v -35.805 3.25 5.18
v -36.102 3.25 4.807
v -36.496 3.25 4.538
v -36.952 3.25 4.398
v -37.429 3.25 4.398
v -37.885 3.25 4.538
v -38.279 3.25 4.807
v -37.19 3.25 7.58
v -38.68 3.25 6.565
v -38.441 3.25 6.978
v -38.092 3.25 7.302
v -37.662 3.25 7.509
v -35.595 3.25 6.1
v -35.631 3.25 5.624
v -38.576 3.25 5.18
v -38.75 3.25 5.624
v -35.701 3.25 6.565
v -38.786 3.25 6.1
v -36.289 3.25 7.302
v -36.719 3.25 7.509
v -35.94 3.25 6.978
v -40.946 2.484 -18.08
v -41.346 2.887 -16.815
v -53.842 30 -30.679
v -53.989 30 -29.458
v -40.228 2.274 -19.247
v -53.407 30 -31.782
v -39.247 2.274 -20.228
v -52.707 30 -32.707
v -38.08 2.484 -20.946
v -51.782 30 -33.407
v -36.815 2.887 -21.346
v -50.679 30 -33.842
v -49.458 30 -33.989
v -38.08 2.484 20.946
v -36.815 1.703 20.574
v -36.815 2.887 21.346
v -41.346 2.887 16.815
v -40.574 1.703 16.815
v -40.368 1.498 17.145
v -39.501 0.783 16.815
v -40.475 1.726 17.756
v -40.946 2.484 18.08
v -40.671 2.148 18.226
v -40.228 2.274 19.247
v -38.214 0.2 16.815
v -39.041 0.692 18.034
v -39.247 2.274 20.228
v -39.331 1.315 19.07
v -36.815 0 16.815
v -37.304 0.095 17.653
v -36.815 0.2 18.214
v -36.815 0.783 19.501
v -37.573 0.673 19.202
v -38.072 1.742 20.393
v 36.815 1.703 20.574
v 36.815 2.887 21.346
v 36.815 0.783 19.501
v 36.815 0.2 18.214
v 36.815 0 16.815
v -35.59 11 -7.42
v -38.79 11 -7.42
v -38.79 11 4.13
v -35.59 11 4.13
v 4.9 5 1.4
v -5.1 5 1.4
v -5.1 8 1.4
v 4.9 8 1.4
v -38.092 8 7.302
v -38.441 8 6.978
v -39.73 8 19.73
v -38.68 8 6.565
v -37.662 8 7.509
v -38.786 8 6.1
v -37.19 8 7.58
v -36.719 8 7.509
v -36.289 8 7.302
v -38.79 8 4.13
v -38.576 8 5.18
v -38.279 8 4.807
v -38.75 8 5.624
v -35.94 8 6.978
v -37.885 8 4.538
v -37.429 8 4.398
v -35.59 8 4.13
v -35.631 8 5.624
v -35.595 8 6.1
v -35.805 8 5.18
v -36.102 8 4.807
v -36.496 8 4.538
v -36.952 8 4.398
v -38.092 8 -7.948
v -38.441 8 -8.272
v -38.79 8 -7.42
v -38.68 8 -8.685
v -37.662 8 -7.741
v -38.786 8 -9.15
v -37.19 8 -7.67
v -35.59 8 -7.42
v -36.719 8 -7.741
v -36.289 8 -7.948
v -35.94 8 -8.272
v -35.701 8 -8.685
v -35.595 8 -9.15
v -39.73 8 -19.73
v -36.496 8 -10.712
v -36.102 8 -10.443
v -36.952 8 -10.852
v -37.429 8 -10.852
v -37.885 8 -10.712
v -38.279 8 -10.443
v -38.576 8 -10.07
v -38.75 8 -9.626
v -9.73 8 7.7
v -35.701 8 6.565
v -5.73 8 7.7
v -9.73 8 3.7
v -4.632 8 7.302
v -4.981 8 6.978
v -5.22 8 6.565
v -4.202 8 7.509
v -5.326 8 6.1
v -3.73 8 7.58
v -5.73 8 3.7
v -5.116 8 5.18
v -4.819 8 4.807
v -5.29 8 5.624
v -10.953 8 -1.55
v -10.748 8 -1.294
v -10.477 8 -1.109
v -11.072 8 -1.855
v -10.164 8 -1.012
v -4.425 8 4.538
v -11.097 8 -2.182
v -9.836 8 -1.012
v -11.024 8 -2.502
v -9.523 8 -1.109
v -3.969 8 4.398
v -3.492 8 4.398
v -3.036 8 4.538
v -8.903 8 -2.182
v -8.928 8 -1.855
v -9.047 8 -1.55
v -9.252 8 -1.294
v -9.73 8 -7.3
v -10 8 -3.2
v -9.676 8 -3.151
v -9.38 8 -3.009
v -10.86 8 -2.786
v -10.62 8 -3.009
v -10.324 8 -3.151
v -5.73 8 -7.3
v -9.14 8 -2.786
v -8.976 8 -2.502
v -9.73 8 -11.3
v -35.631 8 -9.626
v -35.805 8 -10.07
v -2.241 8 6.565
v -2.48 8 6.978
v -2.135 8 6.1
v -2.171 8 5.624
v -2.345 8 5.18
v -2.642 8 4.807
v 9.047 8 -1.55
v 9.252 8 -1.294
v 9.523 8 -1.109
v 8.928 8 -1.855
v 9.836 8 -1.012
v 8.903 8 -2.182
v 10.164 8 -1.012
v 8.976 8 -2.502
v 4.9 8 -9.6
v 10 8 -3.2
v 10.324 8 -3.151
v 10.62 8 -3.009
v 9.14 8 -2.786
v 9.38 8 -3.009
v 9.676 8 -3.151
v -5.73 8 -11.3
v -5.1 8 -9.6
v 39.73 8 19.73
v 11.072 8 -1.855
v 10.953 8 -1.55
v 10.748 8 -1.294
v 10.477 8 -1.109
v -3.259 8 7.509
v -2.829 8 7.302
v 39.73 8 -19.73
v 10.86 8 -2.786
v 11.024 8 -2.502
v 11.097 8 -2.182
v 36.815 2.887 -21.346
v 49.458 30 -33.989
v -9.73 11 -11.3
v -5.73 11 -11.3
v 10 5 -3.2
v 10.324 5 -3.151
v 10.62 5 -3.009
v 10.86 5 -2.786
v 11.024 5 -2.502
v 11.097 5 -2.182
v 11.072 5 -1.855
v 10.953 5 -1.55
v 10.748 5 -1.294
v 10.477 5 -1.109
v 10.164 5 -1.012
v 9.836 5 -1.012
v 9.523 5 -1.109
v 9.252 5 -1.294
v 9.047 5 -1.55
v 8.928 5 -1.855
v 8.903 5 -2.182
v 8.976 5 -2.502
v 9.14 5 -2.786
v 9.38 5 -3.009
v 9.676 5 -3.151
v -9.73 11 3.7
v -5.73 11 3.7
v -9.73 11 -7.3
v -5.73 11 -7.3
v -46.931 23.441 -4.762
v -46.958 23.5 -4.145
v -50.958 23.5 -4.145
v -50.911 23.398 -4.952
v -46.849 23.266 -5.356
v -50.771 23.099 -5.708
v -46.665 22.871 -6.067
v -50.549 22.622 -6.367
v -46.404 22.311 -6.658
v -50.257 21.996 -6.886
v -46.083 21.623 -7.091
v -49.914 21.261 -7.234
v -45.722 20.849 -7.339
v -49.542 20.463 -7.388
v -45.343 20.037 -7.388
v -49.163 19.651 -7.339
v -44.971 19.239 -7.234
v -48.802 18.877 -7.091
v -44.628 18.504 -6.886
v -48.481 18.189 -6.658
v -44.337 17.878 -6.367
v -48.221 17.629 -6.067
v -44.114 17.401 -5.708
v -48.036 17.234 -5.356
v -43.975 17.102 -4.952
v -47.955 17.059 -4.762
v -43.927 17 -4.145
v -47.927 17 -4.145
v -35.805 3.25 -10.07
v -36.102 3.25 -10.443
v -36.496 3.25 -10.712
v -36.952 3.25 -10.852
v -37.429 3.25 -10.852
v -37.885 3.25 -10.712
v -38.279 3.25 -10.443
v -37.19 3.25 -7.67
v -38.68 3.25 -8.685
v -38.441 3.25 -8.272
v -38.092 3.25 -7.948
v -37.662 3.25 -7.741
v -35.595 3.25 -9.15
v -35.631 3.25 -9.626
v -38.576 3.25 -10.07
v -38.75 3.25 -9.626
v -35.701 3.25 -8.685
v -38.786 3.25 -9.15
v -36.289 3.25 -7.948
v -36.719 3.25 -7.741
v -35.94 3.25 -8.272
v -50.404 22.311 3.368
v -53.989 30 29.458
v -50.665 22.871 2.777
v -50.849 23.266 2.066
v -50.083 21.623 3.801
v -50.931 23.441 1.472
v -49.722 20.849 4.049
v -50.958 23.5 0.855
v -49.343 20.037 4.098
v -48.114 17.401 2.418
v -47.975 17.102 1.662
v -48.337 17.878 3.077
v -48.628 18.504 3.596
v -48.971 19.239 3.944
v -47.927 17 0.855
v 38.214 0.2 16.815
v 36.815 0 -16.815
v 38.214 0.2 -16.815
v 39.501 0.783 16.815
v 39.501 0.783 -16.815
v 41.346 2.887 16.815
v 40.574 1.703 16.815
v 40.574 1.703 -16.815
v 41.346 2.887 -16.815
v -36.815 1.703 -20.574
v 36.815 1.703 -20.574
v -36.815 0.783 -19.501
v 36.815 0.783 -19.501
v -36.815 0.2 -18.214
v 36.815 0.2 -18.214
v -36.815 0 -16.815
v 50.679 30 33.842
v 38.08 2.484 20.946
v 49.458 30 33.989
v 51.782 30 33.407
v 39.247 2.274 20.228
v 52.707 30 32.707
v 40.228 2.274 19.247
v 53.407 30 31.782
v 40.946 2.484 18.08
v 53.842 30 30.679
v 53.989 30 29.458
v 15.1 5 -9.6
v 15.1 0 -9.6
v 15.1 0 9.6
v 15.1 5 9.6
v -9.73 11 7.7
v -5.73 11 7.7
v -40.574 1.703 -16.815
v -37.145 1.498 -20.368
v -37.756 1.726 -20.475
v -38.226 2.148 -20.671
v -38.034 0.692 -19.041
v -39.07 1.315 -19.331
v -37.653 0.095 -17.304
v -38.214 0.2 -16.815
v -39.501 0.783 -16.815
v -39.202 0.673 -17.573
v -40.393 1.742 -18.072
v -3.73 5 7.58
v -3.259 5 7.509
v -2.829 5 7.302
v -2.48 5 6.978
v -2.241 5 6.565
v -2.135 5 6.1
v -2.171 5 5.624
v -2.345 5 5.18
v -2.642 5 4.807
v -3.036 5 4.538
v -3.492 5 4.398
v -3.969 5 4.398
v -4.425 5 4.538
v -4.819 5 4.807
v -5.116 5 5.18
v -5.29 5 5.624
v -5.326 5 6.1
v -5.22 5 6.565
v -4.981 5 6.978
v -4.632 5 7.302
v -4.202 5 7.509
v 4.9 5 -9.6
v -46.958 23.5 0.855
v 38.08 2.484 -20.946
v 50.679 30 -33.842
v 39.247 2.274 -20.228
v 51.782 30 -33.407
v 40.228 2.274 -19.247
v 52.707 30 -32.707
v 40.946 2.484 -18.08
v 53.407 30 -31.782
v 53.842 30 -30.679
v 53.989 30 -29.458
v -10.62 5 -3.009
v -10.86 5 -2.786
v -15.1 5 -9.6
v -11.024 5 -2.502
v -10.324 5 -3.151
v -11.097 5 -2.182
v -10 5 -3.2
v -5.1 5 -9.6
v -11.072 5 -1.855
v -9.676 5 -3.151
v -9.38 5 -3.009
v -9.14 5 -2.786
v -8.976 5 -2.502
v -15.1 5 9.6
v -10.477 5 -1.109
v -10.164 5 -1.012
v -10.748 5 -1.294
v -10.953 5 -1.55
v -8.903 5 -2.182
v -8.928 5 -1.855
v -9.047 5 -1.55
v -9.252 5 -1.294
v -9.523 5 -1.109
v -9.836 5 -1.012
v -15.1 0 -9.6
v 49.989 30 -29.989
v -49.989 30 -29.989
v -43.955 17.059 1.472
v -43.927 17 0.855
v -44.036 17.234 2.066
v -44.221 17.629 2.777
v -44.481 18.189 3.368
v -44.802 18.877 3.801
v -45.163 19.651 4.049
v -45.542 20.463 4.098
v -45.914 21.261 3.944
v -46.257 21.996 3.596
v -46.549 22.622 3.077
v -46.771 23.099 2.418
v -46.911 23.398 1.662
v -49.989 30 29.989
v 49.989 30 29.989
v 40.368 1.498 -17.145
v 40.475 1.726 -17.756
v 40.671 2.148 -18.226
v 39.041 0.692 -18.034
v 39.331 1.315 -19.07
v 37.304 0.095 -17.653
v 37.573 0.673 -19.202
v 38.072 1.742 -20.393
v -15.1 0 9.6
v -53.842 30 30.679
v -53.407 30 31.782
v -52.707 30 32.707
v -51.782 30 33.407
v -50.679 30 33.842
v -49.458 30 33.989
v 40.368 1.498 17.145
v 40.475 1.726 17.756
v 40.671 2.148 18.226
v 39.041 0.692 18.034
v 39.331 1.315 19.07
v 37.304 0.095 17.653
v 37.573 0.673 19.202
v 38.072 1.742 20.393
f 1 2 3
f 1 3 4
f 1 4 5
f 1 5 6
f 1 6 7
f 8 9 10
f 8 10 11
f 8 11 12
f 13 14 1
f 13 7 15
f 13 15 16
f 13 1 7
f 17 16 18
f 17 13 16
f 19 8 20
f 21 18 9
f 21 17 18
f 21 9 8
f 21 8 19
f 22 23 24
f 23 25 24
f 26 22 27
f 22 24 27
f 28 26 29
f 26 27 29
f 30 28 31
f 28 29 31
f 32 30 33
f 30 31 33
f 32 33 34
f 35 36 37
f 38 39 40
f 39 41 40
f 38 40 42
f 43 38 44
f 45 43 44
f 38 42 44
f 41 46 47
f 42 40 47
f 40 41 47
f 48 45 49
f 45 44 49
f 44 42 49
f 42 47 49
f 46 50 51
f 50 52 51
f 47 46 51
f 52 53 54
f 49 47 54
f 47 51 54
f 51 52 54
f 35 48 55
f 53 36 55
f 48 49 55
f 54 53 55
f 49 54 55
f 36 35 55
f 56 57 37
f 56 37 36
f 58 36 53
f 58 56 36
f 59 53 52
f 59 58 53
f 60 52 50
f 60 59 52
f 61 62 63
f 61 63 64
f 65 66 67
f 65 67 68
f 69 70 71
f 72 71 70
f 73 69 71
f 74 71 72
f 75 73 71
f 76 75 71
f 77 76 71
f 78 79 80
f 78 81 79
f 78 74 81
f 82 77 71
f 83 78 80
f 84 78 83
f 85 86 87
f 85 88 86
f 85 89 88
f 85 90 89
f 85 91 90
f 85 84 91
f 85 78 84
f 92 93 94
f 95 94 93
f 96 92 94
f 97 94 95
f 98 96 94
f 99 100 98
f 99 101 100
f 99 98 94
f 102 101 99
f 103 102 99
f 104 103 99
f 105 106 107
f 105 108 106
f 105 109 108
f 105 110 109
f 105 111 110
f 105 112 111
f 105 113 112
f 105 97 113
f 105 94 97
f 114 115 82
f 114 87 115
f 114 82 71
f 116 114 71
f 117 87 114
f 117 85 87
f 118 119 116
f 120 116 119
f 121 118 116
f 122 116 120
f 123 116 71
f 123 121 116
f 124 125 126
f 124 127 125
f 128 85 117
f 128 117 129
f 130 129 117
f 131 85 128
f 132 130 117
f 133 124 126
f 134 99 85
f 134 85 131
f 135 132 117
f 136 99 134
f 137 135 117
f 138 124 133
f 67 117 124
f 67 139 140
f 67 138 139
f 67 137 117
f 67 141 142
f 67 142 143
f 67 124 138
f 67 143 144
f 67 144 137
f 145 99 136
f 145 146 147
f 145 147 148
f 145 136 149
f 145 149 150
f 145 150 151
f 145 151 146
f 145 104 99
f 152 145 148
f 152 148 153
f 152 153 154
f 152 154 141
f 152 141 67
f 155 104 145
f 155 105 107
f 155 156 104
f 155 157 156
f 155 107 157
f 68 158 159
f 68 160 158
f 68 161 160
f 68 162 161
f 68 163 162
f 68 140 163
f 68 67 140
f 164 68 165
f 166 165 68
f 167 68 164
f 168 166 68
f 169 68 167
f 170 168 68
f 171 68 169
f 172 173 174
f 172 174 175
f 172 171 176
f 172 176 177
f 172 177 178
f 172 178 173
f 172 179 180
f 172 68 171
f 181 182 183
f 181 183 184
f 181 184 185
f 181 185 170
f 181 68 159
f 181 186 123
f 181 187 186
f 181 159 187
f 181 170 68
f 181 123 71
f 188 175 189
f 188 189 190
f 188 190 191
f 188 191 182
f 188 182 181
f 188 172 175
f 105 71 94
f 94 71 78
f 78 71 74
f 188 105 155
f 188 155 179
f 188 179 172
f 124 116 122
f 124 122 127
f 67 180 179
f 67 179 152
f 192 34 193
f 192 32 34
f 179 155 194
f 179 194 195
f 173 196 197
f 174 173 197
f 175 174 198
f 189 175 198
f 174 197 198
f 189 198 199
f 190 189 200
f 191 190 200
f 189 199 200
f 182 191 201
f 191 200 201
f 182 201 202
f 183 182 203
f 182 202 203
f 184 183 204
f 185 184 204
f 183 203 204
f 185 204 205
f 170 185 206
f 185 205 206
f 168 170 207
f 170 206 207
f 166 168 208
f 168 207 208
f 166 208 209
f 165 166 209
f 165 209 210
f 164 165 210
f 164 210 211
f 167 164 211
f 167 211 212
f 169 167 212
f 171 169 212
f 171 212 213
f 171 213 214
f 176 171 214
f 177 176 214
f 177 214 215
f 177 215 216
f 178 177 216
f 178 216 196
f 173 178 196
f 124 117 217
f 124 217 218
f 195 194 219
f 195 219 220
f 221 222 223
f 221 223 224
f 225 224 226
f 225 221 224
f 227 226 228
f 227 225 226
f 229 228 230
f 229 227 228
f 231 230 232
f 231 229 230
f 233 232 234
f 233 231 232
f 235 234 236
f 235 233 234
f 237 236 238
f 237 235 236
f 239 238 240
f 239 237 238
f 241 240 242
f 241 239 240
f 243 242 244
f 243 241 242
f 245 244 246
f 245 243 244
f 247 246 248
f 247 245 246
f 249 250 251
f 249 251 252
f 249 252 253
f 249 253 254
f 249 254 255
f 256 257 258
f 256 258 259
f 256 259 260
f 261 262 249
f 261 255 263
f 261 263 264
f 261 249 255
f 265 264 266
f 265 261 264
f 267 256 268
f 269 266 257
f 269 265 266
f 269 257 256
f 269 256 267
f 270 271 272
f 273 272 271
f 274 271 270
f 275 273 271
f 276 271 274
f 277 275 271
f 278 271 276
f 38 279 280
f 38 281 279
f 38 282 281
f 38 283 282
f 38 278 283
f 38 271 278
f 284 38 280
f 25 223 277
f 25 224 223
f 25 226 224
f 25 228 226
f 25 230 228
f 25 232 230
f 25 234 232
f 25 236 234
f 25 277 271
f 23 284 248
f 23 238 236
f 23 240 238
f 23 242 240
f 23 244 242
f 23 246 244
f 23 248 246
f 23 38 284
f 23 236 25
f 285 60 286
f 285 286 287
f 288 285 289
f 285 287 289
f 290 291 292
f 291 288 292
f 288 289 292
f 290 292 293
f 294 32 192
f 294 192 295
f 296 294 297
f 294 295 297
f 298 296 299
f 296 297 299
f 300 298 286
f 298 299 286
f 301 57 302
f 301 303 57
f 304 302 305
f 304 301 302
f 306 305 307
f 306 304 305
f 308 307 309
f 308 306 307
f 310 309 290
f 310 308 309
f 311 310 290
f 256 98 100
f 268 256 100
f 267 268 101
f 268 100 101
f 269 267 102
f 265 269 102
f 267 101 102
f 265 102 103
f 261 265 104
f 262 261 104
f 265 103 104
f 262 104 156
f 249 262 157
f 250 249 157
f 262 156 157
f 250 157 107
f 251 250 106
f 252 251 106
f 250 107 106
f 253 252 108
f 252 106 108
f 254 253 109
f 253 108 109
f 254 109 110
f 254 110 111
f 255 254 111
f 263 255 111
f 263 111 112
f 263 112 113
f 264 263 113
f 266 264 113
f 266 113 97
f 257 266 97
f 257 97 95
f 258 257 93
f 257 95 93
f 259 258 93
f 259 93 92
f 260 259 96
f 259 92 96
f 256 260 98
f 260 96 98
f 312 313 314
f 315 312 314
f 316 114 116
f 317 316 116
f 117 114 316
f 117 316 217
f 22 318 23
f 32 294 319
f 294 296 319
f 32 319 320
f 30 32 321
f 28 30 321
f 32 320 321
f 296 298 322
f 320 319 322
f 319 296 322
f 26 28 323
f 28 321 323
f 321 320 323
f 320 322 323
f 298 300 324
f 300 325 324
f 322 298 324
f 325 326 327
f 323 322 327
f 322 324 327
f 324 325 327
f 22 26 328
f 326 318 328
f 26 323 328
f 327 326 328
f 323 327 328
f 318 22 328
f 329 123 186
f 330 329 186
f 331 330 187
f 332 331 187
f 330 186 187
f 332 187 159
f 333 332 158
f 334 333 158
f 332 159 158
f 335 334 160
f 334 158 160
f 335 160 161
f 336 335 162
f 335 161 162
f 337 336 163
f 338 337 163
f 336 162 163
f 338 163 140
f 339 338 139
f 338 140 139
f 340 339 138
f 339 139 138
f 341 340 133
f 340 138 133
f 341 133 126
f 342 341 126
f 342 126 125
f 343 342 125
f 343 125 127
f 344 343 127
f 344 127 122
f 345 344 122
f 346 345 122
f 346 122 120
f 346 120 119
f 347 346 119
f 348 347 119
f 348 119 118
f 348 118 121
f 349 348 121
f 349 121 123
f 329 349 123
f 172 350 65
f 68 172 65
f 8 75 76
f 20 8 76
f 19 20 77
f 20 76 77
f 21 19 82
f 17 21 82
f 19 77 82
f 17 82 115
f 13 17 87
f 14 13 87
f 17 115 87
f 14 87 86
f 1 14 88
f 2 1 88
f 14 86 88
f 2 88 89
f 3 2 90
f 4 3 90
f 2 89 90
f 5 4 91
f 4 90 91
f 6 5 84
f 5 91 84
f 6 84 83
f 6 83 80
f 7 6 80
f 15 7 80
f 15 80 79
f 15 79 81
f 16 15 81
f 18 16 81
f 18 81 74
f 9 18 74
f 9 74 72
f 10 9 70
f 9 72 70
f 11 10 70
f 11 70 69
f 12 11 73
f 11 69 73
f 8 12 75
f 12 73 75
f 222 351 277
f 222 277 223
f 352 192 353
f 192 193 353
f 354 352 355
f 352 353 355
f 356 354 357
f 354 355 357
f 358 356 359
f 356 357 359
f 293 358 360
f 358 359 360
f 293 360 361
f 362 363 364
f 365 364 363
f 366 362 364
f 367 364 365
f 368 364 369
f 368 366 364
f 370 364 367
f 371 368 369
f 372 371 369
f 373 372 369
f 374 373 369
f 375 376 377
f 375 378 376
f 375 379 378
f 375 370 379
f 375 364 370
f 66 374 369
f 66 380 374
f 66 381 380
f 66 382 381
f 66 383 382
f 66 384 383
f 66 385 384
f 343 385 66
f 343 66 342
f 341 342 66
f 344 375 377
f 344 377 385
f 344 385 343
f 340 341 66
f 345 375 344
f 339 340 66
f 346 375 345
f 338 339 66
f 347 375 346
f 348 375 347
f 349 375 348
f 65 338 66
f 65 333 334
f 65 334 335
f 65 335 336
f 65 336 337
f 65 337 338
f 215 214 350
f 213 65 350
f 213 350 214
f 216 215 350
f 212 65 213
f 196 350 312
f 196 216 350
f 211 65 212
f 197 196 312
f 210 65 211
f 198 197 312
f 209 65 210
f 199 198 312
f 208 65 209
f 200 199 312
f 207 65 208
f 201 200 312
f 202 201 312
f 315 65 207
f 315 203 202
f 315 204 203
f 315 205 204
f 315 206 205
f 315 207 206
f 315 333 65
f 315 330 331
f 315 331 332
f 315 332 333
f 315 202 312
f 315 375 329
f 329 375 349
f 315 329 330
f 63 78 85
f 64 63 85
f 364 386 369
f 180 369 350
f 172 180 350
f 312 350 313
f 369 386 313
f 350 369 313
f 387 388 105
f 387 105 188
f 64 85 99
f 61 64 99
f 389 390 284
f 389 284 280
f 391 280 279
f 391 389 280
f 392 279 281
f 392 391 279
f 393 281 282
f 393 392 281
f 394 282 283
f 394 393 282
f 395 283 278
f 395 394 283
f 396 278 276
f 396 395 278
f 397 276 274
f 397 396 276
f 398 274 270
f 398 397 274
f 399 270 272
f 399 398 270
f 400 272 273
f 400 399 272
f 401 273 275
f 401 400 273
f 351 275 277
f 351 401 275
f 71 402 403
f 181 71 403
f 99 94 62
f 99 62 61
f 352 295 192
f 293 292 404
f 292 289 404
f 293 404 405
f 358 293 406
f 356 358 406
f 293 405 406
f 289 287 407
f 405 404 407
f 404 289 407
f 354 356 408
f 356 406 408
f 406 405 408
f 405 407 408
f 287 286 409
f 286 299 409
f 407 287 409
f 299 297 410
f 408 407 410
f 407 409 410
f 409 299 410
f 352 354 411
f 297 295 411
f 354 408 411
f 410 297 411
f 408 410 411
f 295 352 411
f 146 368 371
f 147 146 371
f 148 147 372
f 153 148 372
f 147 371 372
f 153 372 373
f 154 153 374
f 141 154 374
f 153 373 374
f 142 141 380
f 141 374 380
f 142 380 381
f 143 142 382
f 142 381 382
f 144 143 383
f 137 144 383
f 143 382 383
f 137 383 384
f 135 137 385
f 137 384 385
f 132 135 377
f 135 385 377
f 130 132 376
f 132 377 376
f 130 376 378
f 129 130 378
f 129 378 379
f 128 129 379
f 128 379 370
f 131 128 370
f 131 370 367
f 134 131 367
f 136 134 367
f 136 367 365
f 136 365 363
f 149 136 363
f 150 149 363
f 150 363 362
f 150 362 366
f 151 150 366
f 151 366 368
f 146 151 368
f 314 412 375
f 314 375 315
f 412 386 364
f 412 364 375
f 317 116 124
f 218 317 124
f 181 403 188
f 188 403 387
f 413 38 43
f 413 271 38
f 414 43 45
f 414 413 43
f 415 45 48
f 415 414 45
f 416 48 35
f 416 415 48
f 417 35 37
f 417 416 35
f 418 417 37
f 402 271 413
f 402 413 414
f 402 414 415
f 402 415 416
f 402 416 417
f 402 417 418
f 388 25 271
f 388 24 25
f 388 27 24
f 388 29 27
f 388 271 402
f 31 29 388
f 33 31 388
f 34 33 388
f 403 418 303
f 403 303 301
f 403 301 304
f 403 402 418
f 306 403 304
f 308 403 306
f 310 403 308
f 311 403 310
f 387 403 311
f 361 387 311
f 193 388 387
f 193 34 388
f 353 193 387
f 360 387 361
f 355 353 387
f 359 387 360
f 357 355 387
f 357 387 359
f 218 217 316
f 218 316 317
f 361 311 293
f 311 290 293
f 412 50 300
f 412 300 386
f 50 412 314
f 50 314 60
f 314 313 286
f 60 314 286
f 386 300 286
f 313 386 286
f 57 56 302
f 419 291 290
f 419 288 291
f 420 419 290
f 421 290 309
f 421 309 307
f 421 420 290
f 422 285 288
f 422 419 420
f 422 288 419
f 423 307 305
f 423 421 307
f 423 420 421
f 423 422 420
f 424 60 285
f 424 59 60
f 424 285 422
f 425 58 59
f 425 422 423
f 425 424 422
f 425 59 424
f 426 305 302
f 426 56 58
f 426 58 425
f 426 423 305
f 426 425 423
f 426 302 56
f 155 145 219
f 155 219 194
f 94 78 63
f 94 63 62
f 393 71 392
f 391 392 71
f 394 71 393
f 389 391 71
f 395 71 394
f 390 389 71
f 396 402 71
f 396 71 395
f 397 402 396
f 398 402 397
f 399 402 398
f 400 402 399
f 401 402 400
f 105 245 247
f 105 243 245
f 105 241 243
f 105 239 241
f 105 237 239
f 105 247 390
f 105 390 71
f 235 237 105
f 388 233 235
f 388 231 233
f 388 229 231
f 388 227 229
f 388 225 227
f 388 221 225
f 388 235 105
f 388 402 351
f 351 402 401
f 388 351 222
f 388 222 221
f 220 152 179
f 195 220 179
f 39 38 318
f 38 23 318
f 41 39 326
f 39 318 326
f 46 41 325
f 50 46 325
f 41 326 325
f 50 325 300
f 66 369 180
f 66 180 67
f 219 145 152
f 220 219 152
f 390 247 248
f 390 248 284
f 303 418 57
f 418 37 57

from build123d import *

# Parameters (mm, degrees)
SKETCH1_W                = 80
SKETCH1_H                = 40
BOSS_EXTRUDE1_DEPTH      = 30
BOSS_EXTRUDE1_DRAFT      = -25
SKETCH2_W                = 30.2
SKETCH2_H                = 19.2
CUT_EXTRUDE1_DEPTH       = 5
SKETCH3_W                = 99.97845949
SKETCH3_H                = 59.97845949
CUT_EXTRUDE3_DEPTH       = 22
CUT_EXTRUDE3_DRAFT       = -25
CUT_EXTRUDE4_REACH       = 70.521
SKETCH5_R                = 1.1
SKETCH5_W                = 10
SKETCH5_H                = 11
SKETCH6_R                = 1.6
PCB_HEATSETINSERTS_DEPTH = 4.75
SKETCH7_W                = 4
SKETCH7_H                = 4
SKETCH7_W_2              = 3.2
SKETCH7_H_2              = 11.55
BOSS_EXTRUDE3_DEPTH      = 3
FILLET1_R                = 5
USB_C_CUTOUT_REACH       = 102.398


with BuildPart() as part:
    # Sketch1 → Boss-Extrude1 (with draft: the straight prism first)
    with BuildSketch(Plane(origin=(0, 0, 0), x_dir=(1, 0, 0), z_dir=(0, 1, 0))):
        Rectangle(SKETCH1_W, SKETCH1_H)
    extrude(amount=BOSS_EXTRUDE1_DEPTH)
    # Boss-Extrude1: the draft: its side faces are tilted about the plane it starts from
    boss_extrude1_sides = [part.faces().sort_by_distance(p)[0] for p in [
        (-40, 15, 0),
        (0, 15, 20),
        (40, 15, 0),
        (0, 15, -20),
    ]]
    draft(boss_extrude1_sides, Plane(origin=(0, 0, 0), x_dir=(1, 0, 0), z_dir=(0, 1, 0)), BOSS_EXTRUDE1_DRAFT)

    # Sketch2 → Cut-Extrude1 (cut)
    with BuildSketch(Plane.XZ):
        Rectangle(SKETCH2_W, SKETCH2_H)
    extrude(amount=-CUT_EXTRUDE1_DEPTH, mode=Mode.SUBTRACT)


with BuildPart() as cut_extrude3_tool:
    # Sketch3 → Cut-Extrude3 (with draft: the straight prism first)
    with BuildSketch(Plane(origin=(0, 30, 0), x_dir=(1, 0, 0), z_dir=(0, 1, 0))):
        Rectangle(SKETCH3_W, SKETCH3_H)
    extrude(amount=-CUT_EXTRUDE3_DEPTH)
    # Cut-Extrude3: the draft: its side faces are tilted about the plane it starts from
    cut_extrude3_sides = [cut_extrude3_tool.faces().sort_by_distance(p)[0] for p in [
        (-49.989229745, 19, 0),
        (0, 19, 29.989229745),
        (49.989229745, 19, 0),
        (0, 19, -29.989229745),
    ]]
    draft(cut_extrude3_sides, Plane(origin=(0, 30, 0), x_dir=(1, 0, 0), z_dir=(0, 1, 0)), CUT_EXTRUDE3_DRAFT)


with BuildPart() as part_1:
    add(part.part)

    # Cut-Extrude3: cut by cut_extrude3_tool
    add(cut_extrude3_tool.part, mode=Mode.SUBTRACT)

    # Sketch5 → Cut-Extrude4 (cut, up to next)
    with BuildSketch(Plane.XZ.offset(-5), mode=Mode.PRIVATE) as cut_extrude4_sk1:
        with Locations(Location((-10, -2.1, 0), (0, 0, 270))):
            Circle(SKETCH5_R)
    cut_extrude4_tool1 = extrude(cut_extrude4_sk1.sketch, amount=-CUT_EXTRUDE4_REACH, mode=Mode.PRIVATE) & part_1.part
    # Sketch5 → Cut-Extrude4 (cut, up to next)
    with BuildSketch(Plane.XZ.offset(-5), mode=Mode.PRIVATE) as cut_extrude4_sk2:
        with Locations(Location((10, -2.1, 0), (0, 0, 270))):
            Circle(SKETCH5_R)
    cut_extrude4_tool2 = extrude(cut_extrude4_sk2.sketch, amount=-CUT_EXTRUDE4_REACH, mode=Mode.PRIVATE) & part_1.part
    # Sketch5 → Cut-Extrude4 (cut, up to next)
    with BuildSketch(Plane.XZ.offset(-5), mode=Mode.PRIVATE) as cut_extrude4_sk3:
        with Locations((-0.1, -4.1)):
            Rectangle(SKETCH5_W, SKETCH5_H)
    cut_extrude4_tool3 = extrude(cut_extrude4_sk3.sketch, amount=-CUT_EXTRUDE4_REACH, mode=Mode.PRIVATE) & part_1.part
    add(cut_extrude4_tool1.solids().sort_by_distance((-10, 5, -2.1))[0], mode=Mode.SUBTRACT)
    add(cut_extrude4_tool2.solids().sort_by_distance((10, 5, -2.1))[0], mode=Mode.SUBTRACT)
    add(cut_extrude4_tool3.solids().sort_by_distance((-0.1, 5, -4.1))[0], mode=Mode.SUBTRACT)

    # Sketch6 → PCB_HeatSetInserts (cut)
    with BuildSketch(Plane(origin=(0, 8, 0), x_dir=(1, 0, 0), z_dir=(0, 1, 0))):
        with Locations(Location((-37.190461265, -5.98, 0), (0, 0, 270))):
            Circle(SKETCH6_R)
        with Locations(Location((-37.190461265, 9.27, 0), (0, 0, 270))):
            Circle(SKETCH6_R)
        with Locations(Location((-3.730461265, -5.98, 0), (0, 0, 270))):
            Circle(SKETCH6_R)
    extrude(amount=-PCB_HEATSETINSERTS_DEPTH, mode=Mode.SUBTRACT)

    # Sketch7 → Boss-Extrude3 (add)
    with BuildSketch(Plane(origin=(0, 8, 0), x_dir=(1, 0, 0), z_dir=(0, 1, 0))):
        with Locations((-7.730461265, -5.7)):
            Rectangle(SKETCH7_W, SKETCH7_H)
        with Locations((-37.190461265, 1.645)):
            Rectangle(SKETCH7_W_2, SKETCH7_H_2)
        with Locations((-7.730461265, 9.3)):
            Rectangle(SKETCH7_W, SKETCH7_H)
    extrude(amount=BOSS_EXTRUDE3_DEPTH)

    # Fillet1
    fillet1_edges = [part_1.edges().sort_by_distance(p)[0] for p in [
        (0, 0, 20),
        (-40, 0, 0),
        (0, 0, -20),
        (40, 0, 0),
        (46.994614872, 15, 26.994614872),
        (-46.994614872, 15, 26.994614872),
        (-46.994614872, 15, -26.994614872),
        (46.994614872, 15, -26.994614872),
    ]]
    fillet(fillet1_edges, radius=FILLET1_R)

    # USB-C Cutout: up to this plane
    usb_c_cutout_end = Plane(origin=(-40, 0, -20), z_dir=(-0.9063077870366496, -0.4226182617407003, 0))
    # Sketch10 → USB-C Cutout (cut, up to the surface)
    with BuildSketch(Plane(origin=(-35.590461265, 0, 0), x_dir=(0, 0, -1), z_dir=(1, 0, 0)), mode=Mode.PRIVATE) as usb_c_cutout_sk1:
        with BuildLine():
            Line((-0.855, 23.5), (4.145, 23.5))
            ThreePointArc((4.145, 23.5), (7.395, 20.25), (4.145, 17))
            Line((4.145, 17), (-0.855, 17))
            ThreePointArc((-0.855, 17), (-4.105, 20.25), (-0.855, 23.5))
        make_face()
    usb_c_cutout_tool1 = split(extrude(usb_c_cutout_sk1.sketch, amount=-USB_C_CUTOUT_REACH, mode=Mode.PRIVATE), bisect_by=usb_c_cutout_end, keep=Keep.BOTH, mode=Mode.PRIVATE)
    add(usb_c_cutout_tool1.solids().sort_by_distance((-35.590461, 20.25, -1.645))[0], mode=Mode.SUBTRACT)


solid = part_1.part
